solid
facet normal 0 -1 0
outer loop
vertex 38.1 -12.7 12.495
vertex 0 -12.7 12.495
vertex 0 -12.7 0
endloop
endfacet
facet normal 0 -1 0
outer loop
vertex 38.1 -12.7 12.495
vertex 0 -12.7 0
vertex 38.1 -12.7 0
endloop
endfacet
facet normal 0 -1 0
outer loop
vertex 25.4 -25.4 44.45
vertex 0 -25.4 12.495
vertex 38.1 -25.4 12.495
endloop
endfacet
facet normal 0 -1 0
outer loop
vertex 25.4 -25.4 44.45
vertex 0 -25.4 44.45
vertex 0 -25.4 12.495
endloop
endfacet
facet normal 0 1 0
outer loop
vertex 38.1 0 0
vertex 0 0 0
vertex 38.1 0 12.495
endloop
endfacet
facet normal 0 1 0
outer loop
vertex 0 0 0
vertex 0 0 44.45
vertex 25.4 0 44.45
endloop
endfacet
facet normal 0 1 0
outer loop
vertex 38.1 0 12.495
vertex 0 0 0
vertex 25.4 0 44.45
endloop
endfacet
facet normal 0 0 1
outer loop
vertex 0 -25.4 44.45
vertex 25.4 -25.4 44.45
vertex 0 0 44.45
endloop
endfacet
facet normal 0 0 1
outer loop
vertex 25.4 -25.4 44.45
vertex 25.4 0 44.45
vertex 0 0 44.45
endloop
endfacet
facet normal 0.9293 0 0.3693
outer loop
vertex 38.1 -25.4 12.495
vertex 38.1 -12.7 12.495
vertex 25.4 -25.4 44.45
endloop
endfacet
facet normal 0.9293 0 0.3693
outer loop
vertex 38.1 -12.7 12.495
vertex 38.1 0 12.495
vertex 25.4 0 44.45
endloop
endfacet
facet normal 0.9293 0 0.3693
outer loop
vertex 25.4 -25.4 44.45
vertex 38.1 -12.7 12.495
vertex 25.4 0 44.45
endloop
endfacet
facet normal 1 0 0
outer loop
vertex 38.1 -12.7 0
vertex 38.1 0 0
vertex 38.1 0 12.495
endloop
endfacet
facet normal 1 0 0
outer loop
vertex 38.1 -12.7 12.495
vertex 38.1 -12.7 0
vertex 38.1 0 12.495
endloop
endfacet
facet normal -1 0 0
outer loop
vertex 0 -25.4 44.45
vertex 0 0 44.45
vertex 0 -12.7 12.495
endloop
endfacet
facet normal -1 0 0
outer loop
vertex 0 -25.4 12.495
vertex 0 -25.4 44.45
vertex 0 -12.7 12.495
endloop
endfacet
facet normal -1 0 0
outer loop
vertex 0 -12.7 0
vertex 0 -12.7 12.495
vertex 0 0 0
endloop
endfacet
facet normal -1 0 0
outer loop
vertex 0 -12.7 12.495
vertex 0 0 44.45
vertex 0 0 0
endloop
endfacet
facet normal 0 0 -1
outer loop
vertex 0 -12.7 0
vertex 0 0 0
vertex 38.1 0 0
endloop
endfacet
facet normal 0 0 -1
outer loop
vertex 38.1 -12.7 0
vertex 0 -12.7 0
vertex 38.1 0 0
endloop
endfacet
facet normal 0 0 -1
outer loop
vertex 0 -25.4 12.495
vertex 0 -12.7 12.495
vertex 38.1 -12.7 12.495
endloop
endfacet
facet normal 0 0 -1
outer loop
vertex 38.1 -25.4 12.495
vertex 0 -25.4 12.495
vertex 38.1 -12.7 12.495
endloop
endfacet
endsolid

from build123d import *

# Parameters (mm, degrees)
F0_W     = 38.1
F0_H     = 44.45
F1_DEPTH = 12.7
F3_DEPTH = 25.4
F5_DEPTH = 12.7


with BuildPart() as f1:
    # F0 (on Front) → F1 (new body)
    with BuildSketch(Plane.XZ):
        with Locations((19.05, 22.225)):
            Rectangle(F0_W, F0_H)
    extrude(amount=F1_DEPTH)

    # F2 (on face) → F3 (cut)
    with BuildSketch(Plane.XZ.offset(12.7)):
        Polygon((38.1, 44.45), (25.4, 44.45), (38.1, 12.495001), align=None)
    extrude(amount=-F3_DEPTH, mode=Mode.SUBTRACT)

    # F4 (on face) → F5 (join)
    with BuildSketch(Plane.XZ.offset(12.7)):
        Polygon((0, 12.495001), (38.1, 12.495001), (25.4, 44.45), (0, 44.45), align=None)
    extrude(amount=F5_DEPTH)


solid = f1.part
